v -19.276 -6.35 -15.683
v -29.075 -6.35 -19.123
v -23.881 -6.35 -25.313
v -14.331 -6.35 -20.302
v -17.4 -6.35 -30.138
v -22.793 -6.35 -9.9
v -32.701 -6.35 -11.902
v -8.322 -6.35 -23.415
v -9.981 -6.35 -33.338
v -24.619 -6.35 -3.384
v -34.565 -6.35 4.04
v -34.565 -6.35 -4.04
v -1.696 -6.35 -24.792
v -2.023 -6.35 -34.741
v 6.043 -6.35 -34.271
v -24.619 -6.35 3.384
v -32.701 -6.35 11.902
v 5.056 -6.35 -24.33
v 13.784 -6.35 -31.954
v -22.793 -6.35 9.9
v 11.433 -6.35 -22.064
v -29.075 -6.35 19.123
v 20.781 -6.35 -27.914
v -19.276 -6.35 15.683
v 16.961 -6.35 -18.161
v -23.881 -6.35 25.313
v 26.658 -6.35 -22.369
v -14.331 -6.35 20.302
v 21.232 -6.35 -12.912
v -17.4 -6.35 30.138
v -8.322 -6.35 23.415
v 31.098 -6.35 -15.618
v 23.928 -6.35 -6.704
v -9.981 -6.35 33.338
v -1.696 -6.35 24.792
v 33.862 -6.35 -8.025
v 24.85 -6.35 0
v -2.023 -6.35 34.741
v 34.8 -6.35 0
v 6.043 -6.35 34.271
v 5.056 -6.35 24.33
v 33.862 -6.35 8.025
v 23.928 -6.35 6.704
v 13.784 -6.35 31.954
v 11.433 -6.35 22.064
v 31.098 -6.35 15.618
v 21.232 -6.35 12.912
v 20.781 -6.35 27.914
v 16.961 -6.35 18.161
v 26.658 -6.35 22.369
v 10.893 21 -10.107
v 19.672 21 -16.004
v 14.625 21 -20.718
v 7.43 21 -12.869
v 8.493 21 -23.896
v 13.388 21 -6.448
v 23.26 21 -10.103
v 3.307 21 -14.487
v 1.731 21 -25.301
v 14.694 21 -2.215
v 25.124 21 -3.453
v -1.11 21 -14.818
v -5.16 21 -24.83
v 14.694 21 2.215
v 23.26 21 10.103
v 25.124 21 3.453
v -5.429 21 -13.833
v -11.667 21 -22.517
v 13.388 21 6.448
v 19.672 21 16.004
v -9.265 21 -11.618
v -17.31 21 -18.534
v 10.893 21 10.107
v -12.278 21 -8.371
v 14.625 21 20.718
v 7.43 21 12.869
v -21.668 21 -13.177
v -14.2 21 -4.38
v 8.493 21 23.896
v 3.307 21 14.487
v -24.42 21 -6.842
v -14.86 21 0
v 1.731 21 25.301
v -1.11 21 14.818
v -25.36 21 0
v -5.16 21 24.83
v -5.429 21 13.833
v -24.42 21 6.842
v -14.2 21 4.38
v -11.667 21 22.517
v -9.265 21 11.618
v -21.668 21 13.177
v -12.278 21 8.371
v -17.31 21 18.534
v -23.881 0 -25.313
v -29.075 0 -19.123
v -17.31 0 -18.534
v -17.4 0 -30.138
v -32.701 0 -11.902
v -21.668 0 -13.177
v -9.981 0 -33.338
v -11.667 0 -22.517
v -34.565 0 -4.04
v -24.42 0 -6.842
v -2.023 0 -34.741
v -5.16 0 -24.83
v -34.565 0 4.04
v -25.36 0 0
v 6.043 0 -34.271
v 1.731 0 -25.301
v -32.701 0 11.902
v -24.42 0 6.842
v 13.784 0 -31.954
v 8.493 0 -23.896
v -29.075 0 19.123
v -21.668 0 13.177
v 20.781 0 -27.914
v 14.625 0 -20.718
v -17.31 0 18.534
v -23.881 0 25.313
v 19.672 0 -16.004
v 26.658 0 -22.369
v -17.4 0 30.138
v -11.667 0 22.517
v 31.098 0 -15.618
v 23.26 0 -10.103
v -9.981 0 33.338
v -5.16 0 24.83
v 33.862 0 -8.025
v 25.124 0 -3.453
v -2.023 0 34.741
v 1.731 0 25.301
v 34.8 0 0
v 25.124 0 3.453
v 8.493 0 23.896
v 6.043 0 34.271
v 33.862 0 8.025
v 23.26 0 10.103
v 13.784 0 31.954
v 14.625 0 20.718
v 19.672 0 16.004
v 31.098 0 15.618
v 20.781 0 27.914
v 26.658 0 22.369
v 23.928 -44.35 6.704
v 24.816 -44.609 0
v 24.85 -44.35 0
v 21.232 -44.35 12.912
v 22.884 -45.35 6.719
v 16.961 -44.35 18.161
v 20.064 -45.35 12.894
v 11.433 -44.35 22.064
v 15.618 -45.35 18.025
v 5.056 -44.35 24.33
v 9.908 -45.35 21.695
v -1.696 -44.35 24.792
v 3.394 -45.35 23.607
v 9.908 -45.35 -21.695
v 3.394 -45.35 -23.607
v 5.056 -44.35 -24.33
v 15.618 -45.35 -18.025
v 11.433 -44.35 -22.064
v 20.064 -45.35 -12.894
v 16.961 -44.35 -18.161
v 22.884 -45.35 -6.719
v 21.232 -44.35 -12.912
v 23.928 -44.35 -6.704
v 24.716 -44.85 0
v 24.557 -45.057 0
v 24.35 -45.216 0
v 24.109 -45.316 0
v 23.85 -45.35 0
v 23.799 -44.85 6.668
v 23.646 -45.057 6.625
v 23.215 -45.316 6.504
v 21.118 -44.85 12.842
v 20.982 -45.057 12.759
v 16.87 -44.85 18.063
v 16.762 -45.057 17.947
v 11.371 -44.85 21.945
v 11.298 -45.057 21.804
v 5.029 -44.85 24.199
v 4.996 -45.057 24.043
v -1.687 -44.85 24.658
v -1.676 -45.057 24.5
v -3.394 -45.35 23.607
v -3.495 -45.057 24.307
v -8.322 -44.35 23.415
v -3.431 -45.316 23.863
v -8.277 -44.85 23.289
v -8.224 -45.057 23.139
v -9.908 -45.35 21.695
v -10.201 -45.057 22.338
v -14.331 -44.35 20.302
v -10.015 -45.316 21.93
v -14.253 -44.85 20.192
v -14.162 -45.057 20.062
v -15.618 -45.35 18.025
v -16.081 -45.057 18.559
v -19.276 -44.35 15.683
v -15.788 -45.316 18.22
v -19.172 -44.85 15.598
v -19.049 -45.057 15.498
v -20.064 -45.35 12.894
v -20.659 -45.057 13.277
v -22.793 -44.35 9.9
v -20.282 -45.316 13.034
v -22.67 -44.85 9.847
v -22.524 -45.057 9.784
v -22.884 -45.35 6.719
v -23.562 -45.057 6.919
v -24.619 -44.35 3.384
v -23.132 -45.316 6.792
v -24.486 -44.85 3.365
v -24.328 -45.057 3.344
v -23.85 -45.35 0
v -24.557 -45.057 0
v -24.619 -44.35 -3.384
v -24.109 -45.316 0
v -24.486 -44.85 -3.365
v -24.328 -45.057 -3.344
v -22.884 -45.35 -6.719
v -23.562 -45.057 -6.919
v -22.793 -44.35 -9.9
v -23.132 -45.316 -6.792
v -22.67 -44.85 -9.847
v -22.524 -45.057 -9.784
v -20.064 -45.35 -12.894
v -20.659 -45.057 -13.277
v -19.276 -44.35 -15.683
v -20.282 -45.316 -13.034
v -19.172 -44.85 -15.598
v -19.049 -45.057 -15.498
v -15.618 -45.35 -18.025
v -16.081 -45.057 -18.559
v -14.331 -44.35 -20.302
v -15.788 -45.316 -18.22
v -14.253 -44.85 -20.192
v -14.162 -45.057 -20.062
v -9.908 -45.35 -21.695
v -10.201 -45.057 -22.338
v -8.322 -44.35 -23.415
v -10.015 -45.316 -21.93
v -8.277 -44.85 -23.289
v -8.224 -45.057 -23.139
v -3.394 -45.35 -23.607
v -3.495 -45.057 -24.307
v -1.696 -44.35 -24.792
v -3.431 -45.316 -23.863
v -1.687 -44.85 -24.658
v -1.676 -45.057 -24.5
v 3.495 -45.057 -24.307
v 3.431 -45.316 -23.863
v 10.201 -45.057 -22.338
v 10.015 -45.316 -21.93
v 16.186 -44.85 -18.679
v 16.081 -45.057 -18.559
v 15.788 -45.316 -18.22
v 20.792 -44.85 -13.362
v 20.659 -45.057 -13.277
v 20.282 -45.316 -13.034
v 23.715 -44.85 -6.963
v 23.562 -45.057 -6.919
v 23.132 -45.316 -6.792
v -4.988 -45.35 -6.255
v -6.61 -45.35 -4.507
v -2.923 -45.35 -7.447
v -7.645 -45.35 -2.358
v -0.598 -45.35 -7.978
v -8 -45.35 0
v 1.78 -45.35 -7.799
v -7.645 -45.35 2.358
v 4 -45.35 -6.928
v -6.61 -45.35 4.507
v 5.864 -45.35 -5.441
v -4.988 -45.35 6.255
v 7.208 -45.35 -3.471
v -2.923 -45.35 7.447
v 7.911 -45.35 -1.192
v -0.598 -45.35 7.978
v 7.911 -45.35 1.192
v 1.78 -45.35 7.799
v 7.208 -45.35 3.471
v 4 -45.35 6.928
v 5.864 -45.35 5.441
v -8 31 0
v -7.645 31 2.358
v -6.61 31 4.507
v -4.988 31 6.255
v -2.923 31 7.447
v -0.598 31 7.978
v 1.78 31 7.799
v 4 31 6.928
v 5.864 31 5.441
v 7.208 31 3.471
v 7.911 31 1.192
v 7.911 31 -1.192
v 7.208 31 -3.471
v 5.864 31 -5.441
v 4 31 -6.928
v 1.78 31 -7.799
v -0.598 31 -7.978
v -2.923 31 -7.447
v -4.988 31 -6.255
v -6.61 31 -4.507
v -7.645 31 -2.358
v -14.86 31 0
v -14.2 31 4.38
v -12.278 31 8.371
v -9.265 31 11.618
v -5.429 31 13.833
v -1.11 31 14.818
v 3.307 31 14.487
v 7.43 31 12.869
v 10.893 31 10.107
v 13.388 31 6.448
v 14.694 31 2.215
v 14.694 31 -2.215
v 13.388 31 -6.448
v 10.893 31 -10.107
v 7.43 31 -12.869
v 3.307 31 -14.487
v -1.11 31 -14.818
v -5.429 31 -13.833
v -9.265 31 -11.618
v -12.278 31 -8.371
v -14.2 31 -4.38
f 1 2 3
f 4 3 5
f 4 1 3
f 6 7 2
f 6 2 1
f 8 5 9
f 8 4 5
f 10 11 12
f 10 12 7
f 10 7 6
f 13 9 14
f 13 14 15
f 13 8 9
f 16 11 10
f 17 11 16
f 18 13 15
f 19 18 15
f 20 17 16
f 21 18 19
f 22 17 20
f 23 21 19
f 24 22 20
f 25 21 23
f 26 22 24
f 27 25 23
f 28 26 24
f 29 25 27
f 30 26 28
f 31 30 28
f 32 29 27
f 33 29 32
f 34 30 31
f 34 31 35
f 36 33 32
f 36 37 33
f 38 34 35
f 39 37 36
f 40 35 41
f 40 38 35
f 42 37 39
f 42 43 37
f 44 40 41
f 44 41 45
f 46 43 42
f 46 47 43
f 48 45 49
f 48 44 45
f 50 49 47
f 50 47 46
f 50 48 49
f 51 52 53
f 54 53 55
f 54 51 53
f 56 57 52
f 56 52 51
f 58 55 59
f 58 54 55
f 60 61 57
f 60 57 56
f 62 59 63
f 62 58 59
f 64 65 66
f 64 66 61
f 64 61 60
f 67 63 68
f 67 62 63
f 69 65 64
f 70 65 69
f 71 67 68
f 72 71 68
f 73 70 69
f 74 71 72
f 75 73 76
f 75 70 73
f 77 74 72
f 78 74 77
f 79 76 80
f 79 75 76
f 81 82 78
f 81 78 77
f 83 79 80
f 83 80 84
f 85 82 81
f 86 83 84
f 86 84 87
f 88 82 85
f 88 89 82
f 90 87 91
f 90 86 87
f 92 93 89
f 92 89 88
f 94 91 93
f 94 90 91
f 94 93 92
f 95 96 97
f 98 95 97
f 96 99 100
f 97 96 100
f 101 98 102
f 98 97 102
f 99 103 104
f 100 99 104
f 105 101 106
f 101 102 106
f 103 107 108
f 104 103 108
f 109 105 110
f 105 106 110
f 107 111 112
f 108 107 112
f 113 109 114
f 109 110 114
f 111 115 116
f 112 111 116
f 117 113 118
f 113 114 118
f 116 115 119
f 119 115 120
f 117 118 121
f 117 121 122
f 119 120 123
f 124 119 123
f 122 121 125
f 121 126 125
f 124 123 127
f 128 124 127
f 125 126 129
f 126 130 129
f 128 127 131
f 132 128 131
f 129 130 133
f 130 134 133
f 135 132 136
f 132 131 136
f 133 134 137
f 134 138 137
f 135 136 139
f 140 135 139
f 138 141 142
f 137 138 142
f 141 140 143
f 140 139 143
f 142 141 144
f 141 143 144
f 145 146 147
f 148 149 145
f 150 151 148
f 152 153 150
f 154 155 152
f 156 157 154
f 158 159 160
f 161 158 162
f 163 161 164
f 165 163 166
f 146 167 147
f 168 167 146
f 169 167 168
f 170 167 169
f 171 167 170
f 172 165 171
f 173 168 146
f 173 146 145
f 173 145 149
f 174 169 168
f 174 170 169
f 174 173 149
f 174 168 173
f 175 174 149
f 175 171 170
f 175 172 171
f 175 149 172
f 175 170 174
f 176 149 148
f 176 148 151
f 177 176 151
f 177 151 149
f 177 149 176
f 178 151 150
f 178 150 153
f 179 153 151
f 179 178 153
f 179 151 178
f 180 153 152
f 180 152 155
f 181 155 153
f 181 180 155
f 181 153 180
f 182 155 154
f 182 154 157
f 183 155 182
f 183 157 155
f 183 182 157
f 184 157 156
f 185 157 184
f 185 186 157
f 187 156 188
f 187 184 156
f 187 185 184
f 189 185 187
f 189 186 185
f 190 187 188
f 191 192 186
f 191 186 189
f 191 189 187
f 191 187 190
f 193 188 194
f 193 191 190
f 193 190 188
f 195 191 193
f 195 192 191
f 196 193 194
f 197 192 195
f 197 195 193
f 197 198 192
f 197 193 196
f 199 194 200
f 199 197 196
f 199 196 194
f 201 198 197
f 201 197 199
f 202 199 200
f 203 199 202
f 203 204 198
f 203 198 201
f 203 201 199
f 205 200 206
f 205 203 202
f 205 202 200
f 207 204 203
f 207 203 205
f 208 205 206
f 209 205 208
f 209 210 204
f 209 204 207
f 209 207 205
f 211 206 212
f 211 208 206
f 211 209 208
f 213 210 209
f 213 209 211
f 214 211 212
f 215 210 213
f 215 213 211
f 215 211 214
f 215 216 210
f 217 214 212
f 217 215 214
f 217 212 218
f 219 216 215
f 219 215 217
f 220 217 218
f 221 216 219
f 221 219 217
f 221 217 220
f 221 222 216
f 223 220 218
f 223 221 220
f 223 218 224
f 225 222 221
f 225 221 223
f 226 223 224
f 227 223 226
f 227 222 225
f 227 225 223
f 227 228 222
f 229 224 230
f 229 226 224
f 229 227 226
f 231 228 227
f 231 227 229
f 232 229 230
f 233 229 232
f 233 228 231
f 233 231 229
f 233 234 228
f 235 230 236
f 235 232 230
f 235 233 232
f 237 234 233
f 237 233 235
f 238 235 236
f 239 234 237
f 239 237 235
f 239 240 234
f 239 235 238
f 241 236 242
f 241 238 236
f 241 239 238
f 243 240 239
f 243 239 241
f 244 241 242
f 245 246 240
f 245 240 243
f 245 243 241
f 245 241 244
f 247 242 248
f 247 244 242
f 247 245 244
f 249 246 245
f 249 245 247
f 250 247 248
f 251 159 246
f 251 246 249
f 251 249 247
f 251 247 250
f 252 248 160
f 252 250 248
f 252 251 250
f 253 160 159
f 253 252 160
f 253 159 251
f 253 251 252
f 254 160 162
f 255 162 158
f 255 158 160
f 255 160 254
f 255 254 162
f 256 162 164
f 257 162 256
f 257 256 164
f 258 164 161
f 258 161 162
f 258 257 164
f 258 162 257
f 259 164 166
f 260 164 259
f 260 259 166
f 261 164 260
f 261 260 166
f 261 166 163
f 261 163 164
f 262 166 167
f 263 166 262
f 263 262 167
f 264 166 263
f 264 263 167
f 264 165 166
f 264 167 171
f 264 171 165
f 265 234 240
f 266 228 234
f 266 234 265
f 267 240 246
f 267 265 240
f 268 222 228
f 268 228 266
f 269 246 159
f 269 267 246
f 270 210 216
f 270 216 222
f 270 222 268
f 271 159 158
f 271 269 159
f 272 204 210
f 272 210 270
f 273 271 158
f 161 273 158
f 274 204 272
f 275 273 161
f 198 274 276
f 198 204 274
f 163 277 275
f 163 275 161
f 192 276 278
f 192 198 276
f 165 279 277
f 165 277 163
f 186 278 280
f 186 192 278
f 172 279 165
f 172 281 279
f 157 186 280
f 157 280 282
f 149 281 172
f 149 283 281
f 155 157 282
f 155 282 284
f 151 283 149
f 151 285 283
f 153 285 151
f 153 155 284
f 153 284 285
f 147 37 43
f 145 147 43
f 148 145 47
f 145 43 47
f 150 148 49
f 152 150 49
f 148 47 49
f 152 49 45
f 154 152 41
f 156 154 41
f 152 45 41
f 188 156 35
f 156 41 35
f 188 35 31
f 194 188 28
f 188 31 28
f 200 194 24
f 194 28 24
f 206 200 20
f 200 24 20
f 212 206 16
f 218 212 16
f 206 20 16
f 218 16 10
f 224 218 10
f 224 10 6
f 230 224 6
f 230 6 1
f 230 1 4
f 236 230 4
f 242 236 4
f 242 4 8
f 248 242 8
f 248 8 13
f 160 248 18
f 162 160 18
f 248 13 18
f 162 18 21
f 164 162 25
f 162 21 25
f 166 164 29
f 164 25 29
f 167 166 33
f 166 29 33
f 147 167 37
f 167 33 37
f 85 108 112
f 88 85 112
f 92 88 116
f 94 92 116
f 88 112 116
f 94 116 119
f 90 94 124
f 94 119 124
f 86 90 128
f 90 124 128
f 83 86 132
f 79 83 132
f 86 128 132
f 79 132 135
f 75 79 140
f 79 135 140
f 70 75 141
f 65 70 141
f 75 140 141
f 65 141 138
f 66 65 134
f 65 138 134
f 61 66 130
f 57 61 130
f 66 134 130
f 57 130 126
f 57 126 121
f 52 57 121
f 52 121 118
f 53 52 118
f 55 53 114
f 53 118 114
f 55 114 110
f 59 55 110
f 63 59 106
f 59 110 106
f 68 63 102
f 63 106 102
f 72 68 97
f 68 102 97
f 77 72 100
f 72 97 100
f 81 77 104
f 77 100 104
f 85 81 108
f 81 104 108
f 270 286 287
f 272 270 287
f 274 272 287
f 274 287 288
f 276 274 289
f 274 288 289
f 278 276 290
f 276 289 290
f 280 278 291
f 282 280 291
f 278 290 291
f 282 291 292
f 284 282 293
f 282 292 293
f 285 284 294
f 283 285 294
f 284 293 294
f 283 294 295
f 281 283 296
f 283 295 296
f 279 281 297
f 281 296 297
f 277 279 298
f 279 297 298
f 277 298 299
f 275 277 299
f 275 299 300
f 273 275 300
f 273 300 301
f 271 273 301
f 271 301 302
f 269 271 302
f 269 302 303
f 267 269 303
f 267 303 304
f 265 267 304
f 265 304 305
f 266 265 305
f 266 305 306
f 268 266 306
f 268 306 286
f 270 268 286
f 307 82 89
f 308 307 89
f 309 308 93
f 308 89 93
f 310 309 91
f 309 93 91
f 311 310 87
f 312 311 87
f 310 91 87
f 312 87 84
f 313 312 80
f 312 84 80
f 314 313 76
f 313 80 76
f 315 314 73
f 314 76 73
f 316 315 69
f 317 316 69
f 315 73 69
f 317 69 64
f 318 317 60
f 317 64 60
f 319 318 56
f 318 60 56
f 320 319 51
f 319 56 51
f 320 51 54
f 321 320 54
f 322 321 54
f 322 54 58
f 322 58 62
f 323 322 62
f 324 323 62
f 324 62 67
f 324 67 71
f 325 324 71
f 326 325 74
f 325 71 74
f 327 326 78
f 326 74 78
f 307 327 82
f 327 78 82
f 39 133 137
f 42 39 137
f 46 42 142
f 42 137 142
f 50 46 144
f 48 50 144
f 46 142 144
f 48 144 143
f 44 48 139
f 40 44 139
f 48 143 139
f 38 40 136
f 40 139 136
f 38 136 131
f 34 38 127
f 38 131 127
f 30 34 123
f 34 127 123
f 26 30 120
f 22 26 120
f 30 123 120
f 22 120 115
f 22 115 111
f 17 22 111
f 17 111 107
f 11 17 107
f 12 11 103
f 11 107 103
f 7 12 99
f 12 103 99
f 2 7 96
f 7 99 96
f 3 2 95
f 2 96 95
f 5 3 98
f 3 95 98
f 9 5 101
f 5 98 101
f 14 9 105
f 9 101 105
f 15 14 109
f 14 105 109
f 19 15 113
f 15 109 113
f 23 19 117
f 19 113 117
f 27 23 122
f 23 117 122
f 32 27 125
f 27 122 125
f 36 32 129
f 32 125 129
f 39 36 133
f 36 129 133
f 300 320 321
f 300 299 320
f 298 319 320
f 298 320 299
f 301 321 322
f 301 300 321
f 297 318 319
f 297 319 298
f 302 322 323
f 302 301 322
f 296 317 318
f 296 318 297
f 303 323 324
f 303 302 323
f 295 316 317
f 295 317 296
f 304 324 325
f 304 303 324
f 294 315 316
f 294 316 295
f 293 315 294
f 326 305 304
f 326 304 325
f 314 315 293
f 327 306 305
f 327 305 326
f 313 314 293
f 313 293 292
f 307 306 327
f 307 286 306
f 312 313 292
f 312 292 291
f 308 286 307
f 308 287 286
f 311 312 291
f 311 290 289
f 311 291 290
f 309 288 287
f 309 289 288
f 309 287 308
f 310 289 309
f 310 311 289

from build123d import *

# Parameters (mm, degrees)
F0_R     = 34.8
F1_DEPTH = 6.35
F2_R     = 24.85
F3_DEPTH = 39
F4_R     = 1
F5_R     = 25.36
F6_DEPTH = 21
F7_R     = 14.86
F8_DEPTH = 10
F10_D    = 16


with BuildPart() as f1:
    # F0 (on Front) → F1 (new body)
    with BuildSketch(Plane.XZ):
        Circle(F0_R)
    extrude(amount=F1_DEPTH)

    # F2 (on face) → F3 (join)
    with BuildSketch(Plane.XZ.offset(6.35)):
        Circle(F2_R)
    extrude(amount=F3_DEPTH)

    # F4
    f4_edges = [f1.edges().sort_by_distance(p)[0] for p in [
        (-24.85, -45.35, 0),
    ]]
    fillet(f4_edges, radius=F4_R)

    # F5 (on face) → F6 (join)
    with BuildSketch(Plane(origin=(0, 0, 0), x_dir=(-1, 0, 0), z_dir=(0, 1, 0))):
        Circle(F5_R)
    extrude(amount=F6_DEPTH)

    # F7 (on face) → F8 (join)
    with BuildSketch(Plane(origin=(0, 21, 0), x_dir=(-1, 0, 0), z_dir=(0, 1, 0))):
        Circle(F7_R)
    extrude(amount=F8_DEPTH)

    # F10 (through all)
    with Locations(Plane.XZ.offset(45.35)):
        with Locations((0, 0)):
            Hole(F10_D / 2)


solid = f1.part
